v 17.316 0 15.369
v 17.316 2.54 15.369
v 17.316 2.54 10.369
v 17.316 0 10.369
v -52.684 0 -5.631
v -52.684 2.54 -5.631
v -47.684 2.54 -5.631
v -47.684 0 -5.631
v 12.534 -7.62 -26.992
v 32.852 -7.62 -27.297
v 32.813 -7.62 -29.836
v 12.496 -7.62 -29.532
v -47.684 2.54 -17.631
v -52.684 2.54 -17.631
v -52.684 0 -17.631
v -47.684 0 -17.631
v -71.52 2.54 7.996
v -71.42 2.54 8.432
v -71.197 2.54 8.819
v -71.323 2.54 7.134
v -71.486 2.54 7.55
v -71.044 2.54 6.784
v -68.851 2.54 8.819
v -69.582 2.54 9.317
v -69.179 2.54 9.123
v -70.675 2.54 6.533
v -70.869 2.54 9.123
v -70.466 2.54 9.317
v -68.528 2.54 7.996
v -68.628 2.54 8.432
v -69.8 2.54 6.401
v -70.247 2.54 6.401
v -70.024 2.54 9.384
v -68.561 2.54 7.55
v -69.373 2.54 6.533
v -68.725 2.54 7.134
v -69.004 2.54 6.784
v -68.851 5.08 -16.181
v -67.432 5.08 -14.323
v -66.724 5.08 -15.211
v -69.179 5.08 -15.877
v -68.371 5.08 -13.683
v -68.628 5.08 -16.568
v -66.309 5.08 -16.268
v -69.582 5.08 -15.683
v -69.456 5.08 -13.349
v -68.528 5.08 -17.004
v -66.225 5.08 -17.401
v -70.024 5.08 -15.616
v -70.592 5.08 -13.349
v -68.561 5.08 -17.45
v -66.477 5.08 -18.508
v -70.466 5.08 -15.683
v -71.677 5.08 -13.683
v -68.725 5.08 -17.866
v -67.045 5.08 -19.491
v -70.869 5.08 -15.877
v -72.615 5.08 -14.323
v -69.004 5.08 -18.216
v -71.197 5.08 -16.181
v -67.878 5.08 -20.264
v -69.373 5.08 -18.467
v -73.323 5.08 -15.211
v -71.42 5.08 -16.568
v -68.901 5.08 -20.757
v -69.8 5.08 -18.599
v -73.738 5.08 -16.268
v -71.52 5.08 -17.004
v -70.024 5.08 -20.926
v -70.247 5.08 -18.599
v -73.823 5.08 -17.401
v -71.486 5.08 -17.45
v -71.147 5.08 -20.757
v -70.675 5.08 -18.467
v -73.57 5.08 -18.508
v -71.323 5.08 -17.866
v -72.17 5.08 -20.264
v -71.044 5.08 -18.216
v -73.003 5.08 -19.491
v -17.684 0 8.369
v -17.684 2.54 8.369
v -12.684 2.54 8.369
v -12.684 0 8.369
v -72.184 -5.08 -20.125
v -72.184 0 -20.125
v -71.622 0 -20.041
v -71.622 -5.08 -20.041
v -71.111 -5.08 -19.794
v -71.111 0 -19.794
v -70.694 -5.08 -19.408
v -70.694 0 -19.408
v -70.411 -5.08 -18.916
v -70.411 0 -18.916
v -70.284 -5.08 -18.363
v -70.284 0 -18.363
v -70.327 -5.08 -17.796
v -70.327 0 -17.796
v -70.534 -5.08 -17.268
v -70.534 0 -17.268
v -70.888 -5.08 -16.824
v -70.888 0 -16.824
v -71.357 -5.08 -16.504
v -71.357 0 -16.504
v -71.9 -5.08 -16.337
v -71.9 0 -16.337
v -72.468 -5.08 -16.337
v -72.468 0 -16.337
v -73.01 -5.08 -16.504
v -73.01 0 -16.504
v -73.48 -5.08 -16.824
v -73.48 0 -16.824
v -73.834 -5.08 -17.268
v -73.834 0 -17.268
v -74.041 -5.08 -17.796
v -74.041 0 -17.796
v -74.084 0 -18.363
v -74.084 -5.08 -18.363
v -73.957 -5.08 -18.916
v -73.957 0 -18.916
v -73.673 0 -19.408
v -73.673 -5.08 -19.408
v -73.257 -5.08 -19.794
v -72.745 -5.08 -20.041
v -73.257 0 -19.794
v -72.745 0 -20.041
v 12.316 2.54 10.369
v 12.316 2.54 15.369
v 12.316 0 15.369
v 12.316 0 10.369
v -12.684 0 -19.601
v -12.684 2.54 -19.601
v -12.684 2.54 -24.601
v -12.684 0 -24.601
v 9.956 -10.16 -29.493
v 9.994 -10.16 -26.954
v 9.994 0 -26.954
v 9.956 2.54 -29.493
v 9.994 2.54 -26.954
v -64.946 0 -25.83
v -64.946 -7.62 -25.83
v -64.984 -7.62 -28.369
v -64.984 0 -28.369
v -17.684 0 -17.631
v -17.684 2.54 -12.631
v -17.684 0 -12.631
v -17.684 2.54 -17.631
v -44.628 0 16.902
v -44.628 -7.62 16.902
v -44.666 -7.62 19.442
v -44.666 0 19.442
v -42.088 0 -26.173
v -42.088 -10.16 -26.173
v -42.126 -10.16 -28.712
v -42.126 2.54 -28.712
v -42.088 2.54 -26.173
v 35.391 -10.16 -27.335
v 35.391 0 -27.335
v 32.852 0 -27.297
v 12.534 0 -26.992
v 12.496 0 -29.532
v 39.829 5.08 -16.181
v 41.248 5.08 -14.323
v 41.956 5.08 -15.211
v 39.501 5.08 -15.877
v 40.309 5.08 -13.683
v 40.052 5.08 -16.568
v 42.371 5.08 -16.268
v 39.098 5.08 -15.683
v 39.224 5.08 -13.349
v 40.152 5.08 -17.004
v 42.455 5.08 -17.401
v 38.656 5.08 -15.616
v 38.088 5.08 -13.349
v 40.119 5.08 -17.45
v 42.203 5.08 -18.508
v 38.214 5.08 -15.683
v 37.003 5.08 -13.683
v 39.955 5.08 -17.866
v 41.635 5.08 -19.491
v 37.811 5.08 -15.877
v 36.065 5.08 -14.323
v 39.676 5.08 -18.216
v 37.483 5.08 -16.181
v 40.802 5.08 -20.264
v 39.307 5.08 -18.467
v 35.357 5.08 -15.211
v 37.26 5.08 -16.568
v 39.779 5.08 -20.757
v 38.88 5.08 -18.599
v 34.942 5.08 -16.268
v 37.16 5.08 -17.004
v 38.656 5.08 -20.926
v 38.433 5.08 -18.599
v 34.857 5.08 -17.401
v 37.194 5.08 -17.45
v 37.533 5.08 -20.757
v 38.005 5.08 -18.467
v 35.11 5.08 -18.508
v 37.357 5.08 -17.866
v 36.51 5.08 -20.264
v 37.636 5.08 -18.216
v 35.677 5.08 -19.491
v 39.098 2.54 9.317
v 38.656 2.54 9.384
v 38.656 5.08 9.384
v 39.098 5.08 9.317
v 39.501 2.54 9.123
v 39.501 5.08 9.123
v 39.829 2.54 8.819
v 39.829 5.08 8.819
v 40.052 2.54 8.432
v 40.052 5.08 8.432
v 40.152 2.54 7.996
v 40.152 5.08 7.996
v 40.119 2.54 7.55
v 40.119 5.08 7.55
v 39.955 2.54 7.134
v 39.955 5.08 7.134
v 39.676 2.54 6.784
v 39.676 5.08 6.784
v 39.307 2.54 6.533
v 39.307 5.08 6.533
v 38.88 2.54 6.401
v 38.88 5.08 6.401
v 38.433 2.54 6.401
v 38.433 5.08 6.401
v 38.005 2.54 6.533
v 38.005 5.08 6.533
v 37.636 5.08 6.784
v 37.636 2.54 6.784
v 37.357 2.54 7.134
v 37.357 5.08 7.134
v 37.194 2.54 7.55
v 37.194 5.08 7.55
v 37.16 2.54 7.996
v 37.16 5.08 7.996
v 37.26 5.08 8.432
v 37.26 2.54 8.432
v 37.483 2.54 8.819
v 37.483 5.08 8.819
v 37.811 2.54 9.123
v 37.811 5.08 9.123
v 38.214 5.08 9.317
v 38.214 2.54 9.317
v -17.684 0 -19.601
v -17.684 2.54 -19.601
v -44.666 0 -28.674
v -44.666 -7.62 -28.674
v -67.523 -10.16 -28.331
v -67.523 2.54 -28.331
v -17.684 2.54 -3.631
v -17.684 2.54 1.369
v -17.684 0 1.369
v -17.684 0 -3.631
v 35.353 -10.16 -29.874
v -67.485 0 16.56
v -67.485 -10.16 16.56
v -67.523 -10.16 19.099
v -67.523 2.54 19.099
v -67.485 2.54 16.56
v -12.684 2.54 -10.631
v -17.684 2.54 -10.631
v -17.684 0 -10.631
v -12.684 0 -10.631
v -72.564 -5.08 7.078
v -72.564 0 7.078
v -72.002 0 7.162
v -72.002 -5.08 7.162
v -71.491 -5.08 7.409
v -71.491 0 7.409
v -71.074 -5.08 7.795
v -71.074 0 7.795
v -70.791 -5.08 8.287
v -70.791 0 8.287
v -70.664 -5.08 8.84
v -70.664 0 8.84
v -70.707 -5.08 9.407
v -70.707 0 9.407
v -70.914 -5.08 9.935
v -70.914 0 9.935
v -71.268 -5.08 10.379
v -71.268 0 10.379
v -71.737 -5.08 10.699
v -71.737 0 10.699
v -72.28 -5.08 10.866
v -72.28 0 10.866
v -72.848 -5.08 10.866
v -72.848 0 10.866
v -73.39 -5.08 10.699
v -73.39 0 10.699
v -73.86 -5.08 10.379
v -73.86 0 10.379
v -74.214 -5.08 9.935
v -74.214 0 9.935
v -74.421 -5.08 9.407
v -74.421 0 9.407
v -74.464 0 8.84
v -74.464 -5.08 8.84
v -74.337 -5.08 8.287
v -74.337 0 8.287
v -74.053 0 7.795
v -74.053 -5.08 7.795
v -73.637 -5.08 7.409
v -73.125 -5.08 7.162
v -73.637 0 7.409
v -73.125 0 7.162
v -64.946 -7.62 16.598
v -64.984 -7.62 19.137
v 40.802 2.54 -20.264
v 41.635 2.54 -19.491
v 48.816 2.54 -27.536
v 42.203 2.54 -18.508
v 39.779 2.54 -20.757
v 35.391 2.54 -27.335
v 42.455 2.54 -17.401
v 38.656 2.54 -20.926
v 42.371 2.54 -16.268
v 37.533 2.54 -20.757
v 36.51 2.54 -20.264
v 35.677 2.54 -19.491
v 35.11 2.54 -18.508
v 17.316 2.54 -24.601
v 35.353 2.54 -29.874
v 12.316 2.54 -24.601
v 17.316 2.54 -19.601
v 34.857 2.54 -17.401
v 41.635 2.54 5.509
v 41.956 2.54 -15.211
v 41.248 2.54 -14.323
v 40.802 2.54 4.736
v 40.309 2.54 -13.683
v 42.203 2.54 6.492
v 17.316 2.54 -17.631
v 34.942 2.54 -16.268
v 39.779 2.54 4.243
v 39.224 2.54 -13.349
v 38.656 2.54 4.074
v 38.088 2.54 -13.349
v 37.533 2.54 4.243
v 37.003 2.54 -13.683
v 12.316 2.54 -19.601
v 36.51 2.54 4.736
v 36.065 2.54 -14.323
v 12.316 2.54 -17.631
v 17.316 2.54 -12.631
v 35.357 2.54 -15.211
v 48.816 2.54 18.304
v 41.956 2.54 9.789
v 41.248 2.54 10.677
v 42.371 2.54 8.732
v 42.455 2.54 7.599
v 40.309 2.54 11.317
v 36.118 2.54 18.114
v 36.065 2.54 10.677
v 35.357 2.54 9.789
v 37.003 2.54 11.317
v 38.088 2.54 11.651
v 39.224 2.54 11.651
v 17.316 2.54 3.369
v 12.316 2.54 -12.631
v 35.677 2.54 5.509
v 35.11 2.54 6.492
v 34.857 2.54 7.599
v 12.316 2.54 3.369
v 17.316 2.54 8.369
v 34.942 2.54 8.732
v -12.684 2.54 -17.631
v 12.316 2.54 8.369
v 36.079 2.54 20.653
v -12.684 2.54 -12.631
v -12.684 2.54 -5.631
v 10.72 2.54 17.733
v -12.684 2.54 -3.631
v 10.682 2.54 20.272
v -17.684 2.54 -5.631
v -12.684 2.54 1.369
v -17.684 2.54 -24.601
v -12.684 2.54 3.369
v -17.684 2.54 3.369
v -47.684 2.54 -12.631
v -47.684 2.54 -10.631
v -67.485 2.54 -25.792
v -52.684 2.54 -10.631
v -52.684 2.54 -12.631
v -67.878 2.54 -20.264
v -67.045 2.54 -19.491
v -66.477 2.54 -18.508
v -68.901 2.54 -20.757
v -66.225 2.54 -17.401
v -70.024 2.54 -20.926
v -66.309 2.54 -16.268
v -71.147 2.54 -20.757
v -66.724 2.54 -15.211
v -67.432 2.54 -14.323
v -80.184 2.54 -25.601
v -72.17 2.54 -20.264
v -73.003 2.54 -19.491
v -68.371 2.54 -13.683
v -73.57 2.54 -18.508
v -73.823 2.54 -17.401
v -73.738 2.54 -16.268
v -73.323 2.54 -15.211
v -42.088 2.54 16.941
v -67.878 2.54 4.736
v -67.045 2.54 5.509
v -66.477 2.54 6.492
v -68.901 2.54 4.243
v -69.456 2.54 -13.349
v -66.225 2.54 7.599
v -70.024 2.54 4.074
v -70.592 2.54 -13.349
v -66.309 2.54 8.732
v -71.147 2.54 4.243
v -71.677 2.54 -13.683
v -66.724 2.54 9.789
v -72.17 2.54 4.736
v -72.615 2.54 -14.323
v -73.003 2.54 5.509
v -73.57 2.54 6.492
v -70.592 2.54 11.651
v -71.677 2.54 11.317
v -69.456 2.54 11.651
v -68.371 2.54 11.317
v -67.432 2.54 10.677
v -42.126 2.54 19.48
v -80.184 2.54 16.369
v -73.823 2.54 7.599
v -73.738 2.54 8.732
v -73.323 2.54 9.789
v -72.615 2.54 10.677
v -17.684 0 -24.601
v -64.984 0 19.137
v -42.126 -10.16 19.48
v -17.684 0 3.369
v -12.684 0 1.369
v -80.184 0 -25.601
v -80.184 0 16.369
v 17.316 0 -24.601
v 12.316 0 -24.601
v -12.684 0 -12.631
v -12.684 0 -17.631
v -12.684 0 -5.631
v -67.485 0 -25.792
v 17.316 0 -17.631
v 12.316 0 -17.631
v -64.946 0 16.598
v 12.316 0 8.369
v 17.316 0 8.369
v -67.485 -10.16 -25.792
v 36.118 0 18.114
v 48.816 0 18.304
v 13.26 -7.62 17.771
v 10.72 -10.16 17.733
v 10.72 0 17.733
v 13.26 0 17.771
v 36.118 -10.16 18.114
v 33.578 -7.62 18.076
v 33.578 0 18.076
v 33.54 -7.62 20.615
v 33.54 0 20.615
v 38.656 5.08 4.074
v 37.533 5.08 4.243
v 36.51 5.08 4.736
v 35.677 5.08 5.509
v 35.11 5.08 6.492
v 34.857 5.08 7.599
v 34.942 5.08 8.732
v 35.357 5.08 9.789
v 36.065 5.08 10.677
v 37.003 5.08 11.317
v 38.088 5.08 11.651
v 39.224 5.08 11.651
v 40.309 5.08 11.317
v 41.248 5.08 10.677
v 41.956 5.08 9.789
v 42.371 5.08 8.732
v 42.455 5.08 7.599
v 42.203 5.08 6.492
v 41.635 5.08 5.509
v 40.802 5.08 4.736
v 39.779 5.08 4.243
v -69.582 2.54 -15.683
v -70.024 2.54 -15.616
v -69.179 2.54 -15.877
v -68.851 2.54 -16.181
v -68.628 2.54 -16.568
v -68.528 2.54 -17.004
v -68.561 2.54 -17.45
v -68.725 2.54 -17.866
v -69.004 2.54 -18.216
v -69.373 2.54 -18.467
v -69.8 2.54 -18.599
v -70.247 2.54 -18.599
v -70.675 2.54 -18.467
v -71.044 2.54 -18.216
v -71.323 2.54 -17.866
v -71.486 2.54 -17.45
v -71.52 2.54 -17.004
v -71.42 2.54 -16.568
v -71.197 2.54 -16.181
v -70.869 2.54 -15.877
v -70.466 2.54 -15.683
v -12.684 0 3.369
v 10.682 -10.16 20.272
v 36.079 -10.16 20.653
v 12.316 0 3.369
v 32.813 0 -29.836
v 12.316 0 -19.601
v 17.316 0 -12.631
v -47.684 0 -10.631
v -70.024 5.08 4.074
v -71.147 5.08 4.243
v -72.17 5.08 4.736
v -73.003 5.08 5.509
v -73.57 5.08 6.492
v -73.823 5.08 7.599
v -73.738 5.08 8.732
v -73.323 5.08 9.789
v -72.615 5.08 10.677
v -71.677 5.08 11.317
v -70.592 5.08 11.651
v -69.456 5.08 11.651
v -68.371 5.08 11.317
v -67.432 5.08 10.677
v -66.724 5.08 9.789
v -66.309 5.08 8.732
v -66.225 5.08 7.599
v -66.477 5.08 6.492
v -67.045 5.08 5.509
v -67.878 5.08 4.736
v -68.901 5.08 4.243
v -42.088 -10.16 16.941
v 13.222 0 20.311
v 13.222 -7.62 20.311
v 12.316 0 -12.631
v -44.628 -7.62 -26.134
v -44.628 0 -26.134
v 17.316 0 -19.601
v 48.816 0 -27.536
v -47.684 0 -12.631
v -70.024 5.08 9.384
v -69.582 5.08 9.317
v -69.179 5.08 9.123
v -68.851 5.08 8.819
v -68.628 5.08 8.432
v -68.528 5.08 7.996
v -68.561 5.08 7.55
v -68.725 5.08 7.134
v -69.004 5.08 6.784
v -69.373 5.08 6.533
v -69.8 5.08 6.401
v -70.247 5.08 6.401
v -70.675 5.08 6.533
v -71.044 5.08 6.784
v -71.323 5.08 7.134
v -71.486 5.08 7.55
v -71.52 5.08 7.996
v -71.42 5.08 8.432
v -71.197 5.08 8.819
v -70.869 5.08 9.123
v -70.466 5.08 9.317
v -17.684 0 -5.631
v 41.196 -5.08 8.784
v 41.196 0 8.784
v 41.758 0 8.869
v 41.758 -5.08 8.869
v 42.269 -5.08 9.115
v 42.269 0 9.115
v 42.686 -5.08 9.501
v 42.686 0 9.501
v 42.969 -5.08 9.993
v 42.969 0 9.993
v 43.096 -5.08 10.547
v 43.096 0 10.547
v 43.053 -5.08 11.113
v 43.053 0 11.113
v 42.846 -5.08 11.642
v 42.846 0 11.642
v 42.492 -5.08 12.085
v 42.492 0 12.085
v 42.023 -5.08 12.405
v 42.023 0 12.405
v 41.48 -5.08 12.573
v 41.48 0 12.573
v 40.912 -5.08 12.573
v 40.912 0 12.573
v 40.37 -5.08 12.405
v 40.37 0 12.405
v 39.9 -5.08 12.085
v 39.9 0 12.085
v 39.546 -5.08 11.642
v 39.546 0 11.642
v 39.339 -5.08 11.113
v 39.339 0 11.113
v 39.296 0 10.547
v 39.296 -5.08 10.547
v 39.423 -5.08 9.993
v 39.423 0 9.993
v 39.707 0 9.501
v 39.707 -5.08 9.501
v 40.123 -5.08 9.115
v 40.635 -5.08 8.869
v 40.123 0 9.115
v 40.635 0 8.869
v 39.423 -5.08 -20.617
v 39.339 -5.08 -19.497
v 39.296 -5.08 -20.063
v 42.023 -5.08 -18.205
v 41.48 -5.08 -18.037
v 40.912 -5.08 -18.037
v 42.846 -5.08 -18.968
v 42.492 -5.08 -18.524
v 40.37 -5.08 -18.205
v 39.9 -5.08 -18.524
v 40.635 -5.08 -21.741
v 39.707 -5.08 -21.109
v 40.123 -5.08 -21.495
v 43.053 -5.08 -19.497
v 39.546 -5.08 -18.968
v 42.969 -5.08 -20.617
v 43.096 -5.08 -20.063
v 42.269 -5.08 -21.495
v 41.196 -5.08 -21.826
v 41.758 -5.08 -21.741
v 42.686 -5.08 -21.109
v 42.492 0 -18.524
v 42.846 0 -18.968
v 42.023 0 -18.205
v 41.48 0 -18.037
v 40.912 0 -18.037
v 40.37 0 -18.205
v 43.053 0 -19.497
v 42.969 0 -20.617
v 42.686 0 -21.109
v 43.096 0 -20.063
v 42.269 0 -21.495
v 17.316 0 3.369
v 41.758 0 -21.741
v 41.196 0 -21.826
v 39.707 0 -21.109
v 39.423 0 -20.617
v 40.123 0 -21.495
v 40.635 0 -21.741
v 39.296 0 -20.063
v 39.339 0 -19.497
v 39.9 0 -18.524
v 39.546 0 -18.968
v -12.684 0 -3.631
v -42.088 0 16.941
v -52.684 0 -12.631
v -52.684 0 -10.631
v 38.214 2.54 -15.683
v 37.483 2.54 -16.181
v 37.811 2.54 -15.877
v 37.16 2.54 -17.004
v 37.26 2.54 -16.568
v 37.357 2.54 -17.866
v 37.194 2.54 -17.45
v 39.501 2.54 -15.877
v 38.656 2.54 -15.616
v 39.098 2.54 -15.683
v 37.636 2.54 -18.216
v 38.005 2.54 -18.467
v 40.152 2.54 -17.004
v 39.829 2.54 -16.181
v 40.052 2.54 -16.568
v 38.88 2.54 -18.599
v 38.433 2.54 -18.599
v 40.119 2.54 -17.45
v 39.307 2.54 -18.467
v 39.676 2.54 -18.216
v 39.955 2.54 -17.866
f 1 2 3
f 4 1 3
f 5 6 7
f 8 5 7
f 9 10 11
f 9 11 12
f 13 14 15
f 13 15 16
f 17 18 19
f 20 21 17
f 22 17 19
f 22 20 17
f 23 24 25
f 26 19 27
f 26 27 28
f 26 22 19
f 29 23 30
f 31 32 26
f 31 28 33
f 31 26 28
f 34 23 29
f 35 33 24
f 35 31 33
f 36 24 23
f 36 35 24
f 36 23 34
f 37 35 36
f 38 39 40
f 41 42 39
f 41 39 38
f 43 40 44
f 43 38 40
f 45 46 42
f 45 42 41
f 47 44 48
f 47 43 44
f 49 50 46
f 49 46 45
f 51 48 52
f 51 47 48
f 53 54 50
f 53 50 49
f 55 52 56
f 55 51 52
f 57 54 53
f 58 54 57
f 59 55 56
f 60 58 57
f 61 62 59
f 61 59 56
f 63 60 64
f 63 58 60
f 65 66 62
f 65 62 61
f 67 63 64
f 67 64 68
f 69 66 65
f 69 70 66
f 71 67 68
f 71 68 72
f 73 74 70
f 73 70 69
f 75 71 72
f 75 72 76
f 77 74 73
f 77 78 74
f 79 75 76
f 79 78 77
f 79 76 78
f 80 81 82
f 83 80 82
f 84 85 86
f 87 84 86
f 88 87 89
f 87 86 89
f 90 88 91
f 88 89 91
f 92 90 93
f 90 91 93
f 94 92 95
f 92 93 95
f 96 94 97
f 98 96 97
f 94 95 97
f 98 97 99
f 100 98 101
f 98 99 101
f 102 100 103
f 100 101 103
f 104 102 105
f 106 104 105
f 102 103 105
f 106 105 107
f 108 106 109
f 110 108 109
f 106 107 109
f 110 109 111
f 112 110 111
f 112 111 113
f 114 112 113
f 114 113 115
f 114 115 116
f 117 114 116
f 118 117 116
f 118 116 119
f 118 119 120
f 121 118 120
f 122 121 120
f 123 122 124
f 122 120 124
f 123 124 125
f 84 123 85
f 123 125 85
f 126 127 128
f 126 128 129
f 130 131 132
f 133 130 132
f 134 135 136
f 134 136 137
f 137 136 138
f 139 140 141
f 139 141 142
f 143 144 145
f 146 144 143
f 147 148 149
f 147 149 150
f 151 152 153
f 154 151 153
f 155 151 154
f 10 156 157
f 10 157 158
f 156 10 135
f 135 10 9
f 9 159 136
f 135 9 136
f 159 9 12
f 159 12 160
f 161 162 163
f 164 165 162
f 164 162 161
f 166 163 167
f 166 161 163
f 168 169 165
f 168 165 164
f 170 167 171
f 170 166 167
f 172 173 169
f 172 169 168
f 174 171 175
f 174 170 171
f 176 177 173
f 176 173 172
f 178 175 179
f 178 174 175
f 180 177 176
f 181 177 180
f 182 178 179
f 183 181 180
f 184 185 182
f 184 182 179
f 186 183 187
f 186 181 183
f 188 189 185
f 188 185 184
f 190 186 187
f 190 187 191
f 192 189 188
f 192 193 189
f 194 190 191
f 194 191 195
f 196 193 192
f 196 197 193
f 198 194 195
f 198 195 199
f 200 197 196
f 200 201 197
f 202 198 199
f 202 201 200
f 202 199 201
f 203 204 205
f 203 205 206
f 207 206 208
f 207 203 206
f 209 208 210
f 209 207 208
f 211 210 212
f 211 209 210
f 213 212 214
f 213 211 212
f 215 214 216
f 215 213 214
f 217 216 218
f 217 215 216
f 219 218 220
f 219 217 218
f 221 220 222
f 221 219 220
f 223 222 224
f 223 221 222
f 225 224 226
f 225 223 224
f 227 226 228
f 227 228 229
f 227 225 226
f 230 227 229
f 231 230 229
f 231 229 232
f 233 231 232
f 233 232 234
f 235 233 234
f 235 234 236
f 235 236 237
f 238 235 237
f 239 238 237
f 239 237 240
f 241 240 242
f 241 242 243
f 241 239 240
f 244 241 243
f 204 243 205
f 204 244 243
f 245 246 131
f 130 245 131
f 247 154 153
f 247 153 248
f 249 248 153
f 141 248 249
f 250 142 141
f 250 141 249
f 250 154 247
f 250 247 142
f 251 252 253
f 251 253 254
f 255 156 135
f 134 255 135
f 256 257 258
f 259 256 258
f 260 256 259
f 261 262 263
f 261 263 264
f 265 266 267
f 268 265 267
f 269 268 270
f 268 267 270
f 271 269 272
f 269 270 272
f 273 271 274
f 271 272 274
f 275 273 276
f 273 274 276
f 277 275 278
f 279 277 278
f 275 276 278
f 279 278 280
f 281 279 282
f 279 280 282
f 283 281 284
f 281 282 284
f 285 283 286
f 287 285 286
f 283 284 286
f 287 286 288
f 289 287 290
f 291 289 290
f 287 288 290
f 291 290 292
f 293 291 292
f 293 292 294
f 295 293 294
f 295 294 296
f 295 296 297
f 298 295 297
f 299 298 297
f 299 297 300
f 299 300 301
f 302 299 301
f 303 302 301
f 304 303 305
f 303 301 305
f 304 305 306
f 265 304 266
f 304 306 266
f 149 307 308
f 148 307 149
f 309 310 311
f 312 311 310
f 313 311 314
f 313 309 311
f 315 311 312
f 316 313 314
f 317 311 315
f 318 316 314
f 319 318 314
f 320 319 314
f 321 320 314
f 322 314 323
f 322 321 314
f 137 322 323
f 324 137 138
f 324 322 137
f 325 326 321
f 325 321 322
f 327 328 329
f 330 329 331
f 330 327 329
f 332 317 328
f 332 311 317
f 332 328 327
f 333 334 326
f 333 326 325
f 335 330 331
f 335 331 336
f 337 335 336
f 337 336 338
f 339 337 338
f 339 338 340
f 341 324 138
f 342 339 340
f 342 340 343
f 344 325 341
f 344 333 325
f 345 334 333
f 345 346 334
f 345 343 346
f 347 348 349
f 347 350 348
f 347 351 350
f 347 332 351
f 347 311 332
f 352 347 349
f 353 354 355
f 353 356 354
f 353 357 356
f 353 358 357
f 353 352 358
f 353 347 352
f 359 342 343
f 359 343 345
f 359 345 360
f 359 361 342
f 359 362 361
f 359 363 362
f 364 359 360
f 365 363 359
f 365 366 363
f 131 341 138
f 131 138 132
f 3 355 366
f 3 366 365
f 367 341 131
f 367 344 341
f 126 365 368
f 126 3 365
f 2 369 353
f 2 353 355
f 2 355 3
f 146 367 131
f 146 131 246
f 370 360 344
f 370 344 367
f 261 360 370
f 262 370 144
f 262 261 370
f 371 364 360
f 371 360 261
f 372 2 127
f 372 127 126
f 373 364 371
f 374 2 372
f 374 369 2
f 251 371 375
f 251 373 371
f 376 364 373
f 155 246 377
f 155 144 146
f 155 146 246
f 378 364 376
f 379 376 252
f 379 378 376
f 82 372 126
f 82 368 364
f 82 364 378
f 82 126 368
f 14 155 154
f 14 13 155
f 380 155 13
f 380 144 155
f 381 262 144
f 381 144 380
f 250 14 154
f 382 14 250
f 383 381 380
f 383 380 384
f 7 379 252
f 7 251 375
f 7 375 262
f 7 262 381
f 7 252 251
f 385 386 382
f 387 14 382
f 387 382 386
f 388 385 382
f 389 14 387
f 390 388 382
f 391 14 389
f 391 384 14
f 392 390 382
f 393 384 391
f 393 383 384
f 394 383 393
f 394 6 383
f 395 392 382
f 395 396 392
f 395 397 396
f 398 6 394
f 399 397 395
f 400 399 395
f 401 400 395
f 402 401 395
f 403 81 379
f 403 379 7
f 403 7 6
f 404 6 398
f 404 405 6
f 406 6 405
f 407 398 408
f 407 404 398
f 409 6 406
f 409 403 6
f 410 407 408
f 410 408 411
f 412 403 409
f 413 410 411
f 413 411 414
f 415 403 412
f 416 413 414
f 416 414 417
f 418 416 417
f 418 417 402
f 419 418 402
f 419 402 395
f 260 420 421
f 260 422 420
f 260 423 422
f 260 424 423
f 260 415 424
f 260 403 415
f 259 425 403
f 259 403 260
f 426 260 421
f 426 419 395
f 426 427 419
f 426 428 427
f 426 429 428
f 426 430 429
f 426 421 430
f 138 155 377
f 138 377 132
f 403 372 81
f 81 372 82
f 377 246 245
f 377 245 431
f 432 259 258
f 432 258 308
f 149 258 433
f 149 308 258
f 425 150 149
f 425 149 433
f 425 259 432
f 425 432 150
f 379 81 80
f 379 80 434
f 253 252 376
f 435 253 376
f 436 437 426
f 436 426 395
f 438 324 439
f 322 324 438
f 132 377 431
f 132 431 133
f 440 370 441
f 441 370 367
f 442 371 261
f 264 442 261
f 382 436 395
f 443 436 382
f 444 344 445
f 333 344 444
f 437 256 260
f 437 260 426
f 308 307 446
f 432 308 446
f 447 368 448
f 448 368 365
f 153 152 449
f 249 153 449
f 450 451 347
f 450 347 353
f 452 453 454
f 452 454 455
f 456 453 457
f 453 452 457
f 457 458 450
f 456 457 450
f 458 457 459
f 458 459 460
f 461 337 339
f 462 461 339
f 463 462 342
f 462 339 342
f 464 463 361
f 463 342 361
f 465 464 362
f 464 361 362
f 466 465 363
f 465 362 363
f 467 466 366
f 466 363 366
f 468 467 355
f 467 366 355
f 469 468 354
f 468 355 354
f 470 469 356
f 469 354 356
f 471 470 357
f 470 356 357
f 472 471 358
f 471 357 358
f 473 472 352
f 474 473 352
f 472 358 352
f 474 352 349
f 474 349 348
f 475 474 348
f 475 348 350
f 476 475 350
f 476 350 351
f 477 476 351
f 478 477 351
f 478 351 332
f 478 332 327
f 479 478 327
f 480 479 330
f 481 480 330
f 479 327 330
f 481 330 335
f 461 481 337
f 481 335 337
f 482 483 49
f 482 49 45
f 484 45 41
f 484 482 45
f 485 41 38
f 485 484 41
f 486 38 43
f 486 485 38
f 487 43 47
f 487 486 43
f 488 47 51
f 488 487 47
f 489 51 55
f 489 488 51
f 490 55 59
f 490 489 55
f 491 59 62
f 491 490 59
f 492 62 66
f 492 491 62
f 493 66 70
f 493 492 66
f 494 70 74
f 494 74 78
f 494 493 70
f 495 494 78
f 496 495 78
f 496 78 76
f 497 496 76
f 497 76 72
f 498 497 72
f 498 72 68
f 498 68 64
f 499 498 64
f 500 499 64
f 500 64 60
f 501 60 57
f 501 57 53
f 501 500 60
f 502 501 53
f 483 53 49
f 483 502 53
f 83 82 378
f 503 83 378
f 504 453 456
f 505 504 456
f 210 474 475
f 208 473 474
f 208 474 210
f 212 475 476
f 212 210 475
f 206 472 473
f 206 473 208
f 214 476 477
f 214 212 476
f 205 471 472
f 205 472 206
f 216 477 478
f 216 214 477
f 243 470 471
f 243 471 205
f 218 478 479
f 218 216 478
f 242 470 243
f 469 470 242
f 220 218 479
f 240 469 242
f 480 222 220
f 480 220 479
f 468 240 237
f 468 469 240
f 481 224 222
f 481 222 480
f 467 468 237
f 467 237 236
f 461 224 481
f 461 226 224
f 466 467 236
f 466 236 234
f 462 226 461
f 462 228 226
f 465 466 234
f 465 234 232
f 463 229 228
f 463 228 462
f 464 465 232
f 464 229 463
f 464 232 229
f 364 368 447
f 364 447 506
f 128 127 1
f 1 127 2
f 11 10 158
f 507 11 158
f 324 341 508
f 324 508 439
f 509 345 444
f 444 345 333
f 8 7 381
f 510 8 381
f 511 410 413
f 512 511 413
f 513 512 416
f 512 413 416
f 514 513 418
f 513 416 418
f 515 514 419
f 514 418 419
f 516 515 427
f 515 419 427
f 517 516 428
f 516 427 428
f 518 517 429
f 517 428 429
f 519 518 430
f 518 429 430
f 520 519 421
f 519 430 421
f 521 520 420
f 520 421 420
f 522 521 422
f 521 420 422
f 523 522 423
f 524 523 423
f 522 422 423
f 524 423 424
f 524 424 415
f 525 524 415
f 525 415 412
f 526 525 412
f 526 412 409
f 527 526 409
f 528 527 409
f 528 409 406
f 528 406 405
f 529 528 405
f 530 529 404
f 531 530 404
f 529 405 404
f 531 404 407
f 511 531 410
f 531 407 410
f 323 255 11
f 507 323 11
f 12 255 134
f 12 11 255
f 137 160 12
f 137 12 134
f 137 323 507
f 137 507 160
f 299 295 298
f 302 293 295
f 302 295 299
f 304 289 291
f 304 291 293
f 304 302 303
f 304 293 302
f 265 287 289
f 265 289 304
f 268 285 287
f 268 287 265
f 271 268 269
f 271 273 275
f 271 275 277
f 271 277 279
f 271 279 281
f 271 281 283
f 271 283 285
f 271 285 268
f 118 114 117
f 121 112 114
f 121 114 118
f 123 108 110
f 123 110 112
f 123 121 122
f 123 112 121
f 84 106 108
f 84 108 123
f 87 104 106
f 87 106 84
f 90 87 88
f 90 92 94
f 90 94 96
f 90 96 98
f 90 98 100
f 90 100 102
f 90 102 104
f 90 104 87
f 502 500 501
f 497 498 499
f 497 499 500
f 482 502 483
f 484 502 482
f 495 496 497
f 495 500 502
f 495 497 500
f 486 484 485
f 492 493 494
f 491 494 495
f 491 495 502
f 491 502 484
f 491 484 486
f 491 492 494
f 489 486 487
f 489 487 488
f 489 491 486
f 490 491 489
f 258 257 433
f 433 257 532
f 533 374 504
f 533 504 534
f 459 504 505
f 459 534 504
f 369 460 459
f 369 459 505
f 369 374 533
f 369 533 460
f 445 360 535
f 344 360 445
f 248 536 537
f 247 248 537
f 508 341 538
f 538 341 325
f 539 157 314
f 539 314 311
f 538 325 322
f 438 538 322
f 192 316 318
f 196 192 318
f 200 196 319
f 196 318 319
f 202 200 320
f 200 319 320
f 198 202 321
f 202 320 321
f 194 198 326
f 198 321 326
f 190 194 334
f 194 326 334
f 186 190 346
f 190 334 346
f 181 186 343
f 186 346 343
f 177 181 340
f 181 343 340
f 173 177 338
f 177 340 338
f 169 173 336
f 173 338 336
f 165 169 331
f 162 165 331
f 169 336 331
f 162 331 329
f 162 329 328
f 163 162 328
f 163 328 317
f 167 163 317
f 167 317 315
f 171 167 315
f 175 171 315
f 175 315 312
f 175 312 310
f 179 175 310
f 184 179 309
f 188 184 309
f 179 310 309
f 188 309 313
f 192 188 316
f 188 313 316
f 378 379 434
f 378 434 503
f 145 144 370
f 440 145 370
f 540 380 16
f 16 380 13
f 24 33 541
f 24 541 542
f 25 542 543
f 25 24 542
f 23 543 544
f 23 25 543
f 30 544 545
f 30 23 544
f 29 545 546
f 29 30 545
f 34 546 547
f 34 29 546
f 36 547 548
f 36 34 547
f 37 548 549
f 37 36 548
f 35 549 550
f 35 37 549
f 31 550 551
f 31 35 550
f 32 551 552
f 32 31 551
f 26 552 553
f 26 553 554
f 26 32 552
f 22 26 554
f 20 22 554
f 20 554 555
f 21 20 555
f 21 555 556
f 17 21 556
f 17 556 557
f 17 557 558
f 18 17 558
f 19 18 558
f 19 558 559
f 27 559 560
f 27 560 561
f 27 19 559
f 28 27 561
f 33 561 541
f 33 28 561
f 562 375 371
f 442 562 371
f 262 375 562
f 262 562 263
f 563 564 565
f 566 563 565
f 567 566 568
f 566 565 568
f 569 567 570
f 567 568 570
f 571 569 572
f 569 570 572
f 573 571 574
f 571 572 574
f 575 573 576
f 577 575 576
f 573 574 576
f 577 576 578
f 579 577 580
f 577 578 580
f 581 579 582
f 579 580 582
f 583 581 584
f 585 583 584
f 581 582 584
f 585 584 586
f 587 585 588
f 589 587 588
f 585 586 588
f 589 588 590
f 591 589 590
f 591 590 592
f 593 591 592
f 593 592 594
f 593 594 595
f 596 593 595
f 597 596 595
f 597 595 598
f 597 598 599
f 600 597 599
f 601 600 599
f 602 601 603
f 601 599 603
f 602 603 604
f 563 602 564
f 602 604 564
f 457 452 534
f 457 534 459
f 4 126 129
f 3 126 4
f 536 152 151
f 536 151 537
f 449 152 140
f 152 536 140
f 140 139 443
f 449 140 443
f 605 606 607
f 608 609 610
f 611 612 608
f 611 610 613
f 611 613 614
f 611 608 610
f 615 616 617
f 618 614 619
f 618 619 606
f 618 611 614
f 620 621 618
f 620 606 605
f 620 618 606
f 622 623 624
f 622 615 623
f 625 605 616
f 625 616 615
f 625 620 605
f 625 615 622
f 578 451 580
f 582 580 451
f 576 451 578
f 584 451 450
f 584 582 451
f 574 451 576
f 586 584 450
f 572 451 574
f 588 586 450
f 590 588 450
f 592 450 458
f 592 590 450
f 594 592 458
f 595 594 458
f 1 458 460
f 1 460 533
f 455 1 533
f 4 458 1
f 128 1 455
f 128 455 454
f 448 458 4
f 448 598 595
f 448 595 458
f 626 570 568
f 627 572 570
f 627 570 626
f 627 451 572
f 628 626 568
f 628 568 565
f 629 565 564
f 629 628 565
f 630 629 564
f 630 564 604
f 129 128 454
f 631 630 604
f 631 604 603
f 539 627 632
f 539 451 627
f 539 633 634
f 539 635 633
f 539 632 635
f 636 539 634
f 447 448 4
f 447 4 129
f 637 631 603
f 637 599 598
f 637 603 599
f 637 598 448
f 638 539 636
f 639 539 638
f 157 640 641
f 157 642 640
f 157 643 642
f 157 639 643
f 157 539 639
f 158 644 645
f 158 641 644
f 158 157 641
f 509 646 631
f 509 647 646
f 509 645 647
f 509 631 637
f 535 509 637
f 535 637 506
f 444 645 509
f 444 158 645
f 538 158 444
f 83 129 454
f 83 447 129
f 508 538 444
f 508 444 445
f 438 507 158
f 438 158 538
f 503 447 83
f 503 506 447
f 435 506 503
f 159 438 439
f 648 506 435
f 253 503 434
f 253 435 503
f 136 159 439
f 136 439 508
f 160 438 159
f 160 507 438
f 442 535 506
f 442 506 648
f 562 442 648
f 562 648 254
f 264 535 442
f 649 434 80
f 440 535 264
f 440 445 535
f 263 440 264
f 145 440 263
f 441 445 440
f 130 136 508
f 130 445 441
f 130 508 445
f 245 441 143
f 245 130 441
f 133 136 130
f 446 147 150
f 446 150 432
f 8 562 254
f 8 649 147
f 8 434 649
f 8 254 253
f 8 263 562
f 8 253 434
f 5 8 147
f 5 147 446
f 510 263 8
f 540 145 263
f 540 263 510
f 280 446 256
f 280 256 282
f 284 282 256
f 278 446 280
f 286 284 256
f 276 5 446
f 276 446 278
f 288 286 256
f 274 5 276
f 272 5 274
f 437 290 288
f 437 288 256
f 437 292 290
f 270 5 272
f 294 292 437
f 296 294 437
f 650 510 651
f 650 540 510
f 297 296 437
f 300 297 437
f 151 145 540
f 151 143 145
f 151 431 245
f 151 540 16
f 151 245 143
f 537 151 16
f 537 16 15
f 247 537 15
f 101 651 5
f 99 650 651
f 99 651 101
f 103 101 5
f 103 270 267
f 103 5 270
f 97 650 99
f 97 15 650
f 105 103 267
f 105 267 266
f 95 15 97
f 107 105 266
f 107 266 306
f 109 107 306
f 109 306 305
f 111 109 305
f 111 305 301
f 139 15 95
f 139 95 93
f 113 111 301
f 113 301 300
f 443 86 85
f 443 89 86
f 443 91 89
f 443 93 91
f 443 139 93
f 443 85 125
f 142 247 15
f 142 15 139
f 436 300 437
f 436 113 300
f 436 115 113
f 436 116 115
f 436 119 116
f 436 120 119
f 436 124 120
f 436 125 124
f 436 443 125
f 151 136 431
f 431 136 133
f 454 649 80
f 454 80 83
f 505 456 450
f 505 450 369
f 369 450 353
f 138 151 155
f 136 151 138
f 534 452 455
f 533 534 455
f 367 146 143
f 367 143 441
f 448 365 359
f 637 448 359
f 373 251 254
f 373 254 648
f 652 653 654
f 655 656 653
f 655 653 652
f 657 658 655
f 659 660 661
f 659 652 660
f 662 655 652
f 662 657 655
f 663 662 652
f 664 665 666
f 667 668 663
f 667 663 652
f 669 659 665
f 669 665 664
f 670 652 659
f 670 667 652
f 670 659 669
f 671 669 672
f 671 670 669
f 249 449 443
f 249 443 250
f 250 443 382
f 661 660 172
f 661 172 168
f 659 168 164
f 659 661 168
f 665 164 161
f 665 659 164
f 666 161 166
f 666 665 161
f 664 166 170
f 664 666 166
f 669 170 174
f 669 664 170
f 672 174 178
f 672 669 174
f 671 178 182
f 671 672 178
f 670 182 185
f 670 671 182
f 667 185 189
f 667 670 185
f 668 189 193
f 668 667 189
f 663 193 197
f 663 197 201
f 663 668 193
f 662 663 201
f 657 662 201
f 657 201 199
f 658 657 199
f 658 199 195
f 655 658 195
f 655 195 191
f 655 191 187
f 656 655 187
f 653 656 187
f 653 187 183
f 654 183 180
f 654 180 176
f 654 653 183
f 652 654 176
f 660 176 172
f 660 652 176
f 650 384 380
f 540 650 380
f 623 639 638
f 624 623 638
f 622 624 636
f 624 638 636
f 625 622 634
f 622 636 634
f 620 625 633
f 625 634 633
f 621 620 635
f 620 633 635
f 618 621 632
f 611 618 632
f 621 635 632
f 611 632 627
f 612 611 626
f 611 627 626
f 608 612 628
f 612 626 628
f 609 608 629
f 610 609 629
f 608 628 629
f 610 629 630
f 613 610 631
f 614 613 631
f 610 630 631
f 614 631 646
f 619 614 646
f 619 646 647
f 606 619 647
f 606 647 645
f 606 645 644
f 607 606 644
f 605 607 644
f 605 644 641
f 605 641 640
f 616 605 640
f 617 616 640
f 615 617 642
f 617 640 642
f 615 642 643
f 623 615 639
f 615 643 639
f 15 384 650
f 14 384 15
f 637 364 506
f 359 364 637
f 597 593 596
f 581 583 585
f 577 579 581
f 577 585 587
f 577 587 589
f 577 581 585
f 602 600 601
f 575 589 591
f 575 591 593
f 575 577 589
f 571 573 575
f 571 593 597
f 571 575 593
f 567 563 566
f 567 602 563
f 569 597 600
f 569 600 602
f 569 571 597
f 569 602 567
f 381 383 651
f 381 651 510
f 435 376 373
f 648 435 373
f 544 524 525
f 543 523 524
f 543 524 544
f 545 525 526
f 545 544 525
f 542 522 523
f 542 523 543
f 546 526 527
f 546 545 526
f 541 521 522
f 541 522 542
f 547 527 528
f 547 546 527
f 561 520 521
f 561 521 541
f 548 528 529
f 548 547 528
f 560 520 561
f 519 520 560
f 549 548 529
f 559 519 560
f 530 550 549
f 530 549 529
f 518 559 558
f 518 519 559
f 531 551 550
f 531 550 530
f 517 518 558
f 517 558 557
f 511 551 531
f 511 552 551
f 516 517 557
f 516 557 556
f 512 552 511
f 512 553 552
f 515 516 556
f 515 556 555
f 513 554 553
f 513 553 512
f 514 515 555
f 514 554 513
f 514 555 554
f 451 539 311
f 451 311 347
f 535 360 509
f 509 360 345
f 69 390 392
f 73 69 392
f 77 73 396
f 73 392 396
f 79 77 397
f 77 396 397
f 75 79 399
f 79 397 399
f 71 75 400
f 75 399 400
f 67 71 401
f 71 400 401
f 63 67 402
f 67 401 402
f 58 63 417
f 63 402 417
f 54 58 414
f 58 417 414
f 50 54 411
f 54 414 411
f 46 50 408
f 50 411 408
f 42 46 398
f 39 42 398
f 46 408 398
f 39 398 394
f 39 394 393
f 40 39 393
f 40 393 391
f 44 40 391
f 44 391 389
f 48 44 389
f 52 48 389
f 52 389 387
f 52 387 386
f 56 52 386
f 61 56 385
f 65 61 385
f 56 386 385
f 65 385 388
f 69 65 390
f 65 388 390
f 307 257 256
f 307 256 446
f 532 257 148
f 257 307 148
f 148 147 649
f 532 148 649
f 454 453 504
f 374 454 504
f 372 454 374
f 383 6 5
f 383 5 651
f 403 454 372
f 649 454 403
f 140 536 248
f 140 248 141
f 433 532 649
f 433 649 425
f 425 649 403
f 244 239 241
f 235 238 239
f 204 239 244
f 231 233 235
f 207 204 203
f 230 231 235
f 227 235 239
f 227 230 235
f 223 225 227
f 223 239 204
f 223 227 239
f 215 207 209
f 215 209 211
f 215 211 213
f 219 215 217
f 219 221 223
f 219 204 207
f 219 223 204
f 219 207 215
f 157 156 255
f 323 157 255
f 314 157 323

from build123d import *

# Parameters (mm, degrees)
BOSS_EXTRUDE1_DEPTH = 2.54
SKETCH3_W           = 25.4
SKETCH3_H           = 12.7
SKETCH3_W_2         = 20.32
SKETCH3_H_2         = 7.62
BOSS_EXTRUDE3_DEPTH = 2.54
SKETCH4_R           = 1.905
BOSS_EXTRUDE4_DEPTH = 5.08
SKETCH5_R           = 3.81
SKETCH5_R_2         = 1.5
BOSS_EXTRUDE5_DEPTH = 2.54
SKETCH6_W           = 25.4
SKETCH6_H           = 12.7
SKETCH6_W_2         = 20.32
SKETCH6_H_2         = 7.62
BOSS_EXTRUDE8_DEPTH = 2.54
SKETCH12_W          = 5
SKETCH12_H          = 5
CUT_EXTRUDE1_DEPTH  = 2.54


with BuildPart() as part:
    # Sketch2 → Boss-Extrude1 (new body)
    with BuildSketch(Plane(origin=(0, 0, 0), x_dir=(1, 0, 0), z_dir=(0, 1, 0))):
        Polygon((-80.183865598, 25.601069918), (48.816134402, 27.536069918), (48.816134402, -18.304155069), (-80.183865598, -16.369155069), align=None)
    extrude(amount=BOSS_EXTRUDE1_DEPTH)

    # Sketch3 → Boss-Extrude3 (add)
    # profile 1 of 2: a face of its own
    with BuildSketch(Plane(origin=(0.046703878, 0, 17.572613611), x_dir=(0.9998875189808162, 0, 0.014998312784712321), z_dir=(-0.01499831278471232, 0, 0.9998875189808161))):
        with Locations((-54.839594907, -3.81)):
            Rectangle(SKETCH3_W, SKETCH3_H)
        with Locations((-54.839594907, -3.81)):
            Rectangle(SKETCH3_W_2, SKETCH3_H_2, mode=Mode.SUBTRACT)
    # profile 2 of 2: a face of its own
    with BuildSketch(Plane(origin=(0.046703878, 0, 17.572613611), x_dir=(0.9998875189808162, 0, 0.014998312784712321), z_dir=(-0.01499831278471232, 0, 0.9998875189808161))):
        with Locations((23.374916777, -3.81)):
            Rectangle(SKETCH3_W, SKETCH3_H)
        with Locations((23.374916777, -3.81)):
            Rectangle(SKETCH3_W_2, SKETCH3_H_2, mode=Mode.SUBTRACT)
    extrude(amount=BOSS_EXTRUDE3_DEPTH)

    # Sketch4 → Boss-Extrude4 (add)
    with BuildSketch(Plane.XZ):
        with Locations(Location((-72.563865598, 8.982611367, 0), (0, 0, 270))):
            Circle(SKETCH4_R)
        with Locations(Location((-72.183865598, -18.220226216, 0), (0, 0, 270))):
            Circle(SKETCH4_R)
        with Locations(Location((41.196134402, -19.920926216, 0), (0, 0, 270))):
            Circle(SKETCH4_R)
        with Locations(Location((41.196134402, 10.689011367, 0), (0, 0, 270))):
            Circle(SKETCH4_R)
    extrude(amount=BOSS_EXTRUDE4_DEPTH)

    # Sketch5 → Boss-Extrude5 (add)
    # profile 1 of 4: a face of its own
    with BuildSketch(Plane(origin=(0, 2.54, 0), x_dir=(1, 0, 0), z_dir=(0, 1, 0))):
        with Locations(Location((-70.023865598, 17.115957425, 0), (0, 0, 90))):
            Circle(SKETCH5_R)
        with Locations(Location((-70.023865598, 17.115957425, 0), (0, 0, 270))):
            Circle(SKETCH5_R_2, mode=Mode.SUBTRACT)
    # profile 2 of 4: a face of its own
    with BuildSketch(Plane(origin=(0, 2.54, 0), x_dir=(1, 0, 0), z_dir=(0, 1, 0))):
        with Locations(Location((-70.023865598, -7.884042575, 0), (0, 0, 90))):
            Circle(SKETCH5_R)
        with Locations(Location((-70.023865598, -7.884042575, 0), (0, 0, 270))):
            Circle(SKETCH5_R_2, mode=Mode.SUBTRACT)
    # profile 3 of 4: a face of its own
    with BuildSketch(Plane(origin=(0, 2.54, 0), x_dir=(1, 0, 0), z_dir=(0, 1, 0))):
        with Locations(Location((38.656134402, -7.884042575, 0), (0, 0, 90))):
            Circle(SKETCH5_R)
        with Locations(Location((38.656134402, -7.884042575, 0), (0, 0, 270))):
            Circle(SKETCH5_R_2, mode=Mode.SUBTRACT)
    # profile 4 of 4: a face of its own
    with BuildSketch(Plane(origin=(0, 2.54, 0), x_dir=(1, 0, 0), z_dir=(0, 1, 0))):
        with Locations(Location((38.656134402, 17.115957425, 0), (0, 0, 90))):
            Circle(SKETCH5_R)
        with Locations(Location((38.656134402, 17.115957425, 0), (0, 0, 270))):
            Circle(SKETCH5_R_2, mode=Mode.SUBTRACT)
    extrude(amount=BOSS_EXTRUDE5_DEPTH)

    # Sketch6 → Boss-Extrude8 (add)
    # profile 1 of 2: a face of its own
    with BuildSketch(Plane(origin=(-0.401966976, 0, -26.797798398), x_dir=(-0.9998875189808162, 0, 0.014998312784712349), z_dir=(-0.014998312784712347, 0, -0.9998875189808161))):
        with Locations((-23.097259161, -3.81)):
            Rectangle(SKETCH6_W, SKETCH6_H)
        with Locations((-23.097259161, -3.81)):
            Rectangle(SKETCH6_W_2, SKETCH6_H_2, mode=Mode.SUBTRACT)
    # profile 2 of 2: a face of its own
    with BuildSketch(Plane(origin=(-0.401966976, 0, -26.797798398), x_dir=(-0.9998875189808162, 0, 0.014998312784712349), z_dir=(-0.014998312784712347, 0, -0.9998875189808161))):
        with Locations((54.390873581, -3.81)):
            Rectangle(SKETCH6_W, SKETCH6_H)
        with Locations((54.390873581, -3.81)):
            Rectangle(SKETCH6_W_2, SKETCH6_H_2, mode=Mode.SUBTRACT)
    extrude(amount=BOSS_EXTRUDE8_DEPTH)

    # Sketch12 → Cut-Extrude1 (cut)
    with BuildSketch(Plane(origin=(0, 2.54, 0), x_dir=(1, 0, 0), z_dir=(0, 1, 0))):
        with Locations((-50.183865598, 15.131238659)):
            Rectangle(SKETCH12_W, SKETCH12_H)
        with Locations((-50.183865598, 8.131238659)):
            Rectangle(SKETCH12_W, SKETCH12_H)
        with Locations((-15.183865598, 22.10067619)):
            Rectangle(SKETCH12_W, SKETCH12_H)
        with Locations((-15.183865598, 15.131238659)):
            Rectangle(SKETCH12_W, SKETCH12_H)
        with Locations((-15.183865598, 8.131238659)):
            Rectangle(SKETCH12_W, SKETCH12_H)
        with Locations((-15.183865598, 1.131238659)):
            Rectangle(SKETCH12_W, SKETCH12_H)
        with Locations((-15.183865598, -5.868761341)):
            Rectangle(SKETCH12_W, SKETCH12_H)
        with Locations((14.816134346, -12.868761341)):
            Rectangle(SKETCH12_W, SKETCH12_H)
        with Locations((14.816134346, -5.868761341)):
            Rectangle(SKETCH12_W, SKETCH12_H)
        with Locations((14.816134346, 22.10067619)):
            Rectangle(SKETCH12_W, SKETCH12_H)
        with Locations((14.816134346, 15.131238659)):
            Rectangle(SKETCH12_W, SKETCH12_H)
    extrude(amount=-CUT_EXTRUDE1_DEPTH, mode=Mode.SUBTRACT)


solid = part.part
